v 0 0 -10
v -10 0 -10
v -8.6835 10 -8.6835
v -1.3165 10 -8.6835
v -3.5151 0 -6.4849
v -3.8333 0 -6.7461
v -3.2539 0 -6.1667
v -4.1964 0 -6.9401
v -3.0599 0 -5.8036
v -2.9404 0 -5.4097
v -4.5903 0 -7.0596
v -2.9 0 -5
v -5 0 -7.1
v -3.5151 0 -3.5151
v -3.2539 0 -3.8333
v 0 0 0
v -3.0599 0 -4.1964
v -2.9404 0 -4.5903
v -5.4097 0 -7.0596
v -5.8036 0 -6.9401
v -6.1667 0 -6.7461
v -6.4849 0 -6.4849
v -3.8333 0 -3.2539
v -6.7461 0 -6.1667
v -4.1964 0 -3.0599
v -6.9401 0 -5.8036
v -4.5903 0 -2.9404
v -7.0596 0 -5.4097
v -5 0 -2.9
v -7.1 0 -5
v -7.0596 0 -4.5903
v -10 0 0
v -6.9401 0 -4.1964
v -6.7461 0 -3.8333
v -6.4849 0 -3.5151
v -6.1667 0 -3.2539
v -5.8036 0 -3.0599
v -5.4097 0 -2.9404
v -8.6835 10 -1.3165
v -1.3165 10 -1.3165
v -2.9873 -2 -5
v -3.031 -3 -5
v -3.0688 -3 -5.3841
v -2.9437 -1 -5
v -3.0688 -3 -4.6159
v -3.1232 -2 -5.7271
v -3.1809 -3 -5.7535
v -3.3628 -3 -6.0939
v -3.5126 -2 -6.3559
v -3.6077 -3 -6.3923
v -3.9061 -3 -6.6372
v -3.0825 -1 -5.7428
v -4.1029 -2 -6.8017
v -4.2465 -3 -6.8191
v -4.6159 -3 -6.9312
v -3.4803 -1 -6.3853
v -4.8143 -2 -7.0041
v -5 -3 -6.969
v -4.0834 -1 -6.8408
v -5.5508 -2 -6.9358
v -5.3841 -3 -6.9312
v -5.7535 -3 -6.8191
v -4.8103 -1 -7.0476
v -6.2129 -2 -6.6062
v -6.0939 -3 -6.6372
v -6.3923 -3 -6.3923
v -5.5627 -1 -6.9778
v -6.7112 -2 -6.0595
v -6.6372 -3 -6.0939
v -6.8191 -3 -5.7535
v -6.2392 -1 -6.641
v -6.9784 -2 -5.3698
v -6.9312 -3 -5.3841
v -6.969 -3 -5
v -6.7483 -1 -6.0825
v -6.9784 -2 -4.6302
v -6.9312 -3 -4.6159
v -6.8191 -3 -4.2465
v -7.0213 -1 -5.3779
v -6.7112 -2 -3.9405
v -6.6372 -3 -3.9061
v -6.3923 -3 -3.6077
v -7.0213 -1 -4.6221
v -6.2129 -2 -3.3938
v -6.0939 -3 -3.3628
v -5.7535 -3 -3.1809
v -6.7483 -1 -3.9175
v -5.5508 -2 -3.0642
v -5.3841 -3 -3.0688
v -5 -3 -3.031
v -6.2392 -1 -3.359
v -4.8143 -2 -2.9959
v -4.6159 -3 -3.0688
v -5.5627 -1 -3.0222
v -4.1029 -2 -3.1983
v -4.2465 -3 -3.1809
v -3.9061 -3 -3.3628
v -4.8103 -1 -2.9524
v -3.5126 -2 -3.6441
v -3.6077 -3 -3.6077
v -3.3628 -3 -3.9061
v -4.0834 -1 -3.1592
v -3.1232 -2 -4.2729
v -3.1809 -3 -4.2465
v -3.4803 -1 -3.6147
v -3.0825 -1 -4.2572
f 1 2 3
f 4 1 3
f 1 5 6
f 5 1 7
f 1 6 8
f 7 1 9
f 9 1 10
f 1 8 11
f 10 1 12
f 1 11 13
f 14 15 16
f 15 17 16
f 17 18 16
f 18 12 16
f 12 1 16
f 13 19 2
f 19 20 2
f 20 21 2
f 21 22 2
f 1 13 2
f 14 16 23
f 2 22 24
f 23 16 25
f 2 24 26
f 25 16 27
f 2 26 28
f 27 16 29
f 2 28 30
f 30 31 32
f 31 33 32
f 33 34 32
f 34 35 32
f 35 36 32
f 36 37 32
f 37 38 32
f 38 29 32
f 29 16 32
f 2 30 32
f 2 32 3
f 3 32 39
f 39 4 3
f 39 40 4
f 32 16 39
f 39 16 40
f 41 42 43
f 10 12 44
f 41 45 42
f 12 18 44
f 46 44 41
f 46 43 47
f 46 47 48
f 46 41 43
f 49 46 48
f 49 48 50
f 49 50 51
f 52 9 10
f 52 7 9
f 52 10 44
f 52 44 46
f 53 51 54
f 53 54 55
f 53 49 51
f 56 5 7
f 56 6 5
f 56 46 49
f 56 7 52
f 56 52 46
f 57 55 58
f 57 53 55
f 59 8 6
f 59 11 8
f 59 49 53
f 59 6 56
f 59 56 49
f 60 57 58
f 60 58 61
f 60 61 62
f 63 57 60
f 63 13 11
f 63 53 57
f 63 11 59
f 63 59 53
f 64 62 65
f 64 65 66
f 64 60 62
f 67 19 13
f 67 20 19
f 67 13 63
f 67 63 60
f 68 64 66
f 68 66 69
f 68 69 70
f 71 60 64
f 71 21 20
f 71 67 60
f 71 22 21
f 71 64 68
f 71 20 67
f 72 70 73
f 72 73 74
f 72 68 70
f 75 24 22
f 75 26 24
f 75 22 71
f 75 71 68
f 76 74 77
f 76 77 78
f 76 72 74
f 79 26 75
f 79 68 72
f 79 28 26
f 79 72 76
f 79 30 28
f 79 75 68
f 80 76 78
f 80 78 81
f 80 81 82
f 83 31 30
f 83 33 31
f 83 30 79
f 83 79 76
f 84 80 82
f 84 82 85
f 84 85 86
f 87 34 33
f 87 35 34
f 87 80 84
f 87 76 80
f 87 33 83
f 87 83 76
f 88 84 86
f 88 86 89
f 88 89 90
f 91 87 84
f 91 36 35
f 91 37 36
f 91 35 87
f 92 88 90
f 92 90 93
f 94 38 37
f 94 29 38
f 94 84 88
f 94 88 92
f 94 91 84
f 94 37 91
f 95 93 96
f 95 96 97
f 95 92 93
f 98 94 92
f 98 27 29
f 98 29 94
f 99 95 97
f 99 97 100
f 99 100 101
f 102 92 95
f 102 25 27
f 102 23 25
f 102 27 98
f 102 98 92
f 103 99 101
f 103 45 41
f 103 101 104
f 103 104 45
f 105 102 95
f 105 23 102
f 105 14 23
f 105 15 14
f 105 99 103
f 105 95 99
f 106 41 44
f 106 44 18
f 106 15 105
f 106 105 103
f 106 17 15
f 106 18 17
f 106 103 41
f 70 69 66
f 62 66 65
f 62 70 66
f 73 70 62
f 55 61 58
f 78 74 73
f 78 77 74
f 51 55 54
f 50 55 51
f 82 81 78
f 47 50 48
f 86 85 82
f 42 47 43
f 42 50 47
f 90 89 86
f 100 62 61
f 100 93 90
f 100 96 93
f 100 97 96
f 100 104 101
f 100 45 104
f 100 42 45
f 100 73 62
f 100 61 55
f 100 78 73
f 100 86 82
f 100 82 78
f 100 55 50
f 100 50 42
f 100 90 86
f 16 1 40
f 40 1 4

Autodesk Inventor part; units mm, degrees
ref_plane "YZ Plane" through (0, 0, 0) normal (1, 0, 0) x (0, 1, 0)
ref_plane "XZ Plane" through (0, 0, 0) normal (0, 1, 0) x (-1, 0, 0)
ref_plane "XY Plane" through (0, 0, 0) normal (0, 0, 1) x (1, 0, 0)
sketch "Sketch1" plane through (0, 0, 0) normal (0, 1, 0) x (-1, 0, 0)
  line L0 (0, 0) -> (10, 0)
  line L1 (10, 0) -> (10, -10)
  line L2 (10, -10) -> (0, -10)
  line L3 (0, -10) -> (0, 0)
  dimension "d0" = 10
  dimension "d1" = 10
extrude "Extrusion1" add sketch "Sketch1" along normal blind 10 draft -7.5
sketch "Sketch2" plane through (0, 0, 0) normal (0, -1, 0) x (1, 0, 0)
  circle A0 centre (-5, -5) radius 2.1
  line L0 (0, -10) -> (0, 0) projected
  line L1 (-10, -10) -> (0, -10) projected
  point P0 (0, -5)
  point P1 (-5, -10)
  dimension "d4" = 4.2
extrude "Extrusion2" add sketch "Sketch2" along normal blind 3 draft -2.5
properties part number "Press  Fit Foot A"
